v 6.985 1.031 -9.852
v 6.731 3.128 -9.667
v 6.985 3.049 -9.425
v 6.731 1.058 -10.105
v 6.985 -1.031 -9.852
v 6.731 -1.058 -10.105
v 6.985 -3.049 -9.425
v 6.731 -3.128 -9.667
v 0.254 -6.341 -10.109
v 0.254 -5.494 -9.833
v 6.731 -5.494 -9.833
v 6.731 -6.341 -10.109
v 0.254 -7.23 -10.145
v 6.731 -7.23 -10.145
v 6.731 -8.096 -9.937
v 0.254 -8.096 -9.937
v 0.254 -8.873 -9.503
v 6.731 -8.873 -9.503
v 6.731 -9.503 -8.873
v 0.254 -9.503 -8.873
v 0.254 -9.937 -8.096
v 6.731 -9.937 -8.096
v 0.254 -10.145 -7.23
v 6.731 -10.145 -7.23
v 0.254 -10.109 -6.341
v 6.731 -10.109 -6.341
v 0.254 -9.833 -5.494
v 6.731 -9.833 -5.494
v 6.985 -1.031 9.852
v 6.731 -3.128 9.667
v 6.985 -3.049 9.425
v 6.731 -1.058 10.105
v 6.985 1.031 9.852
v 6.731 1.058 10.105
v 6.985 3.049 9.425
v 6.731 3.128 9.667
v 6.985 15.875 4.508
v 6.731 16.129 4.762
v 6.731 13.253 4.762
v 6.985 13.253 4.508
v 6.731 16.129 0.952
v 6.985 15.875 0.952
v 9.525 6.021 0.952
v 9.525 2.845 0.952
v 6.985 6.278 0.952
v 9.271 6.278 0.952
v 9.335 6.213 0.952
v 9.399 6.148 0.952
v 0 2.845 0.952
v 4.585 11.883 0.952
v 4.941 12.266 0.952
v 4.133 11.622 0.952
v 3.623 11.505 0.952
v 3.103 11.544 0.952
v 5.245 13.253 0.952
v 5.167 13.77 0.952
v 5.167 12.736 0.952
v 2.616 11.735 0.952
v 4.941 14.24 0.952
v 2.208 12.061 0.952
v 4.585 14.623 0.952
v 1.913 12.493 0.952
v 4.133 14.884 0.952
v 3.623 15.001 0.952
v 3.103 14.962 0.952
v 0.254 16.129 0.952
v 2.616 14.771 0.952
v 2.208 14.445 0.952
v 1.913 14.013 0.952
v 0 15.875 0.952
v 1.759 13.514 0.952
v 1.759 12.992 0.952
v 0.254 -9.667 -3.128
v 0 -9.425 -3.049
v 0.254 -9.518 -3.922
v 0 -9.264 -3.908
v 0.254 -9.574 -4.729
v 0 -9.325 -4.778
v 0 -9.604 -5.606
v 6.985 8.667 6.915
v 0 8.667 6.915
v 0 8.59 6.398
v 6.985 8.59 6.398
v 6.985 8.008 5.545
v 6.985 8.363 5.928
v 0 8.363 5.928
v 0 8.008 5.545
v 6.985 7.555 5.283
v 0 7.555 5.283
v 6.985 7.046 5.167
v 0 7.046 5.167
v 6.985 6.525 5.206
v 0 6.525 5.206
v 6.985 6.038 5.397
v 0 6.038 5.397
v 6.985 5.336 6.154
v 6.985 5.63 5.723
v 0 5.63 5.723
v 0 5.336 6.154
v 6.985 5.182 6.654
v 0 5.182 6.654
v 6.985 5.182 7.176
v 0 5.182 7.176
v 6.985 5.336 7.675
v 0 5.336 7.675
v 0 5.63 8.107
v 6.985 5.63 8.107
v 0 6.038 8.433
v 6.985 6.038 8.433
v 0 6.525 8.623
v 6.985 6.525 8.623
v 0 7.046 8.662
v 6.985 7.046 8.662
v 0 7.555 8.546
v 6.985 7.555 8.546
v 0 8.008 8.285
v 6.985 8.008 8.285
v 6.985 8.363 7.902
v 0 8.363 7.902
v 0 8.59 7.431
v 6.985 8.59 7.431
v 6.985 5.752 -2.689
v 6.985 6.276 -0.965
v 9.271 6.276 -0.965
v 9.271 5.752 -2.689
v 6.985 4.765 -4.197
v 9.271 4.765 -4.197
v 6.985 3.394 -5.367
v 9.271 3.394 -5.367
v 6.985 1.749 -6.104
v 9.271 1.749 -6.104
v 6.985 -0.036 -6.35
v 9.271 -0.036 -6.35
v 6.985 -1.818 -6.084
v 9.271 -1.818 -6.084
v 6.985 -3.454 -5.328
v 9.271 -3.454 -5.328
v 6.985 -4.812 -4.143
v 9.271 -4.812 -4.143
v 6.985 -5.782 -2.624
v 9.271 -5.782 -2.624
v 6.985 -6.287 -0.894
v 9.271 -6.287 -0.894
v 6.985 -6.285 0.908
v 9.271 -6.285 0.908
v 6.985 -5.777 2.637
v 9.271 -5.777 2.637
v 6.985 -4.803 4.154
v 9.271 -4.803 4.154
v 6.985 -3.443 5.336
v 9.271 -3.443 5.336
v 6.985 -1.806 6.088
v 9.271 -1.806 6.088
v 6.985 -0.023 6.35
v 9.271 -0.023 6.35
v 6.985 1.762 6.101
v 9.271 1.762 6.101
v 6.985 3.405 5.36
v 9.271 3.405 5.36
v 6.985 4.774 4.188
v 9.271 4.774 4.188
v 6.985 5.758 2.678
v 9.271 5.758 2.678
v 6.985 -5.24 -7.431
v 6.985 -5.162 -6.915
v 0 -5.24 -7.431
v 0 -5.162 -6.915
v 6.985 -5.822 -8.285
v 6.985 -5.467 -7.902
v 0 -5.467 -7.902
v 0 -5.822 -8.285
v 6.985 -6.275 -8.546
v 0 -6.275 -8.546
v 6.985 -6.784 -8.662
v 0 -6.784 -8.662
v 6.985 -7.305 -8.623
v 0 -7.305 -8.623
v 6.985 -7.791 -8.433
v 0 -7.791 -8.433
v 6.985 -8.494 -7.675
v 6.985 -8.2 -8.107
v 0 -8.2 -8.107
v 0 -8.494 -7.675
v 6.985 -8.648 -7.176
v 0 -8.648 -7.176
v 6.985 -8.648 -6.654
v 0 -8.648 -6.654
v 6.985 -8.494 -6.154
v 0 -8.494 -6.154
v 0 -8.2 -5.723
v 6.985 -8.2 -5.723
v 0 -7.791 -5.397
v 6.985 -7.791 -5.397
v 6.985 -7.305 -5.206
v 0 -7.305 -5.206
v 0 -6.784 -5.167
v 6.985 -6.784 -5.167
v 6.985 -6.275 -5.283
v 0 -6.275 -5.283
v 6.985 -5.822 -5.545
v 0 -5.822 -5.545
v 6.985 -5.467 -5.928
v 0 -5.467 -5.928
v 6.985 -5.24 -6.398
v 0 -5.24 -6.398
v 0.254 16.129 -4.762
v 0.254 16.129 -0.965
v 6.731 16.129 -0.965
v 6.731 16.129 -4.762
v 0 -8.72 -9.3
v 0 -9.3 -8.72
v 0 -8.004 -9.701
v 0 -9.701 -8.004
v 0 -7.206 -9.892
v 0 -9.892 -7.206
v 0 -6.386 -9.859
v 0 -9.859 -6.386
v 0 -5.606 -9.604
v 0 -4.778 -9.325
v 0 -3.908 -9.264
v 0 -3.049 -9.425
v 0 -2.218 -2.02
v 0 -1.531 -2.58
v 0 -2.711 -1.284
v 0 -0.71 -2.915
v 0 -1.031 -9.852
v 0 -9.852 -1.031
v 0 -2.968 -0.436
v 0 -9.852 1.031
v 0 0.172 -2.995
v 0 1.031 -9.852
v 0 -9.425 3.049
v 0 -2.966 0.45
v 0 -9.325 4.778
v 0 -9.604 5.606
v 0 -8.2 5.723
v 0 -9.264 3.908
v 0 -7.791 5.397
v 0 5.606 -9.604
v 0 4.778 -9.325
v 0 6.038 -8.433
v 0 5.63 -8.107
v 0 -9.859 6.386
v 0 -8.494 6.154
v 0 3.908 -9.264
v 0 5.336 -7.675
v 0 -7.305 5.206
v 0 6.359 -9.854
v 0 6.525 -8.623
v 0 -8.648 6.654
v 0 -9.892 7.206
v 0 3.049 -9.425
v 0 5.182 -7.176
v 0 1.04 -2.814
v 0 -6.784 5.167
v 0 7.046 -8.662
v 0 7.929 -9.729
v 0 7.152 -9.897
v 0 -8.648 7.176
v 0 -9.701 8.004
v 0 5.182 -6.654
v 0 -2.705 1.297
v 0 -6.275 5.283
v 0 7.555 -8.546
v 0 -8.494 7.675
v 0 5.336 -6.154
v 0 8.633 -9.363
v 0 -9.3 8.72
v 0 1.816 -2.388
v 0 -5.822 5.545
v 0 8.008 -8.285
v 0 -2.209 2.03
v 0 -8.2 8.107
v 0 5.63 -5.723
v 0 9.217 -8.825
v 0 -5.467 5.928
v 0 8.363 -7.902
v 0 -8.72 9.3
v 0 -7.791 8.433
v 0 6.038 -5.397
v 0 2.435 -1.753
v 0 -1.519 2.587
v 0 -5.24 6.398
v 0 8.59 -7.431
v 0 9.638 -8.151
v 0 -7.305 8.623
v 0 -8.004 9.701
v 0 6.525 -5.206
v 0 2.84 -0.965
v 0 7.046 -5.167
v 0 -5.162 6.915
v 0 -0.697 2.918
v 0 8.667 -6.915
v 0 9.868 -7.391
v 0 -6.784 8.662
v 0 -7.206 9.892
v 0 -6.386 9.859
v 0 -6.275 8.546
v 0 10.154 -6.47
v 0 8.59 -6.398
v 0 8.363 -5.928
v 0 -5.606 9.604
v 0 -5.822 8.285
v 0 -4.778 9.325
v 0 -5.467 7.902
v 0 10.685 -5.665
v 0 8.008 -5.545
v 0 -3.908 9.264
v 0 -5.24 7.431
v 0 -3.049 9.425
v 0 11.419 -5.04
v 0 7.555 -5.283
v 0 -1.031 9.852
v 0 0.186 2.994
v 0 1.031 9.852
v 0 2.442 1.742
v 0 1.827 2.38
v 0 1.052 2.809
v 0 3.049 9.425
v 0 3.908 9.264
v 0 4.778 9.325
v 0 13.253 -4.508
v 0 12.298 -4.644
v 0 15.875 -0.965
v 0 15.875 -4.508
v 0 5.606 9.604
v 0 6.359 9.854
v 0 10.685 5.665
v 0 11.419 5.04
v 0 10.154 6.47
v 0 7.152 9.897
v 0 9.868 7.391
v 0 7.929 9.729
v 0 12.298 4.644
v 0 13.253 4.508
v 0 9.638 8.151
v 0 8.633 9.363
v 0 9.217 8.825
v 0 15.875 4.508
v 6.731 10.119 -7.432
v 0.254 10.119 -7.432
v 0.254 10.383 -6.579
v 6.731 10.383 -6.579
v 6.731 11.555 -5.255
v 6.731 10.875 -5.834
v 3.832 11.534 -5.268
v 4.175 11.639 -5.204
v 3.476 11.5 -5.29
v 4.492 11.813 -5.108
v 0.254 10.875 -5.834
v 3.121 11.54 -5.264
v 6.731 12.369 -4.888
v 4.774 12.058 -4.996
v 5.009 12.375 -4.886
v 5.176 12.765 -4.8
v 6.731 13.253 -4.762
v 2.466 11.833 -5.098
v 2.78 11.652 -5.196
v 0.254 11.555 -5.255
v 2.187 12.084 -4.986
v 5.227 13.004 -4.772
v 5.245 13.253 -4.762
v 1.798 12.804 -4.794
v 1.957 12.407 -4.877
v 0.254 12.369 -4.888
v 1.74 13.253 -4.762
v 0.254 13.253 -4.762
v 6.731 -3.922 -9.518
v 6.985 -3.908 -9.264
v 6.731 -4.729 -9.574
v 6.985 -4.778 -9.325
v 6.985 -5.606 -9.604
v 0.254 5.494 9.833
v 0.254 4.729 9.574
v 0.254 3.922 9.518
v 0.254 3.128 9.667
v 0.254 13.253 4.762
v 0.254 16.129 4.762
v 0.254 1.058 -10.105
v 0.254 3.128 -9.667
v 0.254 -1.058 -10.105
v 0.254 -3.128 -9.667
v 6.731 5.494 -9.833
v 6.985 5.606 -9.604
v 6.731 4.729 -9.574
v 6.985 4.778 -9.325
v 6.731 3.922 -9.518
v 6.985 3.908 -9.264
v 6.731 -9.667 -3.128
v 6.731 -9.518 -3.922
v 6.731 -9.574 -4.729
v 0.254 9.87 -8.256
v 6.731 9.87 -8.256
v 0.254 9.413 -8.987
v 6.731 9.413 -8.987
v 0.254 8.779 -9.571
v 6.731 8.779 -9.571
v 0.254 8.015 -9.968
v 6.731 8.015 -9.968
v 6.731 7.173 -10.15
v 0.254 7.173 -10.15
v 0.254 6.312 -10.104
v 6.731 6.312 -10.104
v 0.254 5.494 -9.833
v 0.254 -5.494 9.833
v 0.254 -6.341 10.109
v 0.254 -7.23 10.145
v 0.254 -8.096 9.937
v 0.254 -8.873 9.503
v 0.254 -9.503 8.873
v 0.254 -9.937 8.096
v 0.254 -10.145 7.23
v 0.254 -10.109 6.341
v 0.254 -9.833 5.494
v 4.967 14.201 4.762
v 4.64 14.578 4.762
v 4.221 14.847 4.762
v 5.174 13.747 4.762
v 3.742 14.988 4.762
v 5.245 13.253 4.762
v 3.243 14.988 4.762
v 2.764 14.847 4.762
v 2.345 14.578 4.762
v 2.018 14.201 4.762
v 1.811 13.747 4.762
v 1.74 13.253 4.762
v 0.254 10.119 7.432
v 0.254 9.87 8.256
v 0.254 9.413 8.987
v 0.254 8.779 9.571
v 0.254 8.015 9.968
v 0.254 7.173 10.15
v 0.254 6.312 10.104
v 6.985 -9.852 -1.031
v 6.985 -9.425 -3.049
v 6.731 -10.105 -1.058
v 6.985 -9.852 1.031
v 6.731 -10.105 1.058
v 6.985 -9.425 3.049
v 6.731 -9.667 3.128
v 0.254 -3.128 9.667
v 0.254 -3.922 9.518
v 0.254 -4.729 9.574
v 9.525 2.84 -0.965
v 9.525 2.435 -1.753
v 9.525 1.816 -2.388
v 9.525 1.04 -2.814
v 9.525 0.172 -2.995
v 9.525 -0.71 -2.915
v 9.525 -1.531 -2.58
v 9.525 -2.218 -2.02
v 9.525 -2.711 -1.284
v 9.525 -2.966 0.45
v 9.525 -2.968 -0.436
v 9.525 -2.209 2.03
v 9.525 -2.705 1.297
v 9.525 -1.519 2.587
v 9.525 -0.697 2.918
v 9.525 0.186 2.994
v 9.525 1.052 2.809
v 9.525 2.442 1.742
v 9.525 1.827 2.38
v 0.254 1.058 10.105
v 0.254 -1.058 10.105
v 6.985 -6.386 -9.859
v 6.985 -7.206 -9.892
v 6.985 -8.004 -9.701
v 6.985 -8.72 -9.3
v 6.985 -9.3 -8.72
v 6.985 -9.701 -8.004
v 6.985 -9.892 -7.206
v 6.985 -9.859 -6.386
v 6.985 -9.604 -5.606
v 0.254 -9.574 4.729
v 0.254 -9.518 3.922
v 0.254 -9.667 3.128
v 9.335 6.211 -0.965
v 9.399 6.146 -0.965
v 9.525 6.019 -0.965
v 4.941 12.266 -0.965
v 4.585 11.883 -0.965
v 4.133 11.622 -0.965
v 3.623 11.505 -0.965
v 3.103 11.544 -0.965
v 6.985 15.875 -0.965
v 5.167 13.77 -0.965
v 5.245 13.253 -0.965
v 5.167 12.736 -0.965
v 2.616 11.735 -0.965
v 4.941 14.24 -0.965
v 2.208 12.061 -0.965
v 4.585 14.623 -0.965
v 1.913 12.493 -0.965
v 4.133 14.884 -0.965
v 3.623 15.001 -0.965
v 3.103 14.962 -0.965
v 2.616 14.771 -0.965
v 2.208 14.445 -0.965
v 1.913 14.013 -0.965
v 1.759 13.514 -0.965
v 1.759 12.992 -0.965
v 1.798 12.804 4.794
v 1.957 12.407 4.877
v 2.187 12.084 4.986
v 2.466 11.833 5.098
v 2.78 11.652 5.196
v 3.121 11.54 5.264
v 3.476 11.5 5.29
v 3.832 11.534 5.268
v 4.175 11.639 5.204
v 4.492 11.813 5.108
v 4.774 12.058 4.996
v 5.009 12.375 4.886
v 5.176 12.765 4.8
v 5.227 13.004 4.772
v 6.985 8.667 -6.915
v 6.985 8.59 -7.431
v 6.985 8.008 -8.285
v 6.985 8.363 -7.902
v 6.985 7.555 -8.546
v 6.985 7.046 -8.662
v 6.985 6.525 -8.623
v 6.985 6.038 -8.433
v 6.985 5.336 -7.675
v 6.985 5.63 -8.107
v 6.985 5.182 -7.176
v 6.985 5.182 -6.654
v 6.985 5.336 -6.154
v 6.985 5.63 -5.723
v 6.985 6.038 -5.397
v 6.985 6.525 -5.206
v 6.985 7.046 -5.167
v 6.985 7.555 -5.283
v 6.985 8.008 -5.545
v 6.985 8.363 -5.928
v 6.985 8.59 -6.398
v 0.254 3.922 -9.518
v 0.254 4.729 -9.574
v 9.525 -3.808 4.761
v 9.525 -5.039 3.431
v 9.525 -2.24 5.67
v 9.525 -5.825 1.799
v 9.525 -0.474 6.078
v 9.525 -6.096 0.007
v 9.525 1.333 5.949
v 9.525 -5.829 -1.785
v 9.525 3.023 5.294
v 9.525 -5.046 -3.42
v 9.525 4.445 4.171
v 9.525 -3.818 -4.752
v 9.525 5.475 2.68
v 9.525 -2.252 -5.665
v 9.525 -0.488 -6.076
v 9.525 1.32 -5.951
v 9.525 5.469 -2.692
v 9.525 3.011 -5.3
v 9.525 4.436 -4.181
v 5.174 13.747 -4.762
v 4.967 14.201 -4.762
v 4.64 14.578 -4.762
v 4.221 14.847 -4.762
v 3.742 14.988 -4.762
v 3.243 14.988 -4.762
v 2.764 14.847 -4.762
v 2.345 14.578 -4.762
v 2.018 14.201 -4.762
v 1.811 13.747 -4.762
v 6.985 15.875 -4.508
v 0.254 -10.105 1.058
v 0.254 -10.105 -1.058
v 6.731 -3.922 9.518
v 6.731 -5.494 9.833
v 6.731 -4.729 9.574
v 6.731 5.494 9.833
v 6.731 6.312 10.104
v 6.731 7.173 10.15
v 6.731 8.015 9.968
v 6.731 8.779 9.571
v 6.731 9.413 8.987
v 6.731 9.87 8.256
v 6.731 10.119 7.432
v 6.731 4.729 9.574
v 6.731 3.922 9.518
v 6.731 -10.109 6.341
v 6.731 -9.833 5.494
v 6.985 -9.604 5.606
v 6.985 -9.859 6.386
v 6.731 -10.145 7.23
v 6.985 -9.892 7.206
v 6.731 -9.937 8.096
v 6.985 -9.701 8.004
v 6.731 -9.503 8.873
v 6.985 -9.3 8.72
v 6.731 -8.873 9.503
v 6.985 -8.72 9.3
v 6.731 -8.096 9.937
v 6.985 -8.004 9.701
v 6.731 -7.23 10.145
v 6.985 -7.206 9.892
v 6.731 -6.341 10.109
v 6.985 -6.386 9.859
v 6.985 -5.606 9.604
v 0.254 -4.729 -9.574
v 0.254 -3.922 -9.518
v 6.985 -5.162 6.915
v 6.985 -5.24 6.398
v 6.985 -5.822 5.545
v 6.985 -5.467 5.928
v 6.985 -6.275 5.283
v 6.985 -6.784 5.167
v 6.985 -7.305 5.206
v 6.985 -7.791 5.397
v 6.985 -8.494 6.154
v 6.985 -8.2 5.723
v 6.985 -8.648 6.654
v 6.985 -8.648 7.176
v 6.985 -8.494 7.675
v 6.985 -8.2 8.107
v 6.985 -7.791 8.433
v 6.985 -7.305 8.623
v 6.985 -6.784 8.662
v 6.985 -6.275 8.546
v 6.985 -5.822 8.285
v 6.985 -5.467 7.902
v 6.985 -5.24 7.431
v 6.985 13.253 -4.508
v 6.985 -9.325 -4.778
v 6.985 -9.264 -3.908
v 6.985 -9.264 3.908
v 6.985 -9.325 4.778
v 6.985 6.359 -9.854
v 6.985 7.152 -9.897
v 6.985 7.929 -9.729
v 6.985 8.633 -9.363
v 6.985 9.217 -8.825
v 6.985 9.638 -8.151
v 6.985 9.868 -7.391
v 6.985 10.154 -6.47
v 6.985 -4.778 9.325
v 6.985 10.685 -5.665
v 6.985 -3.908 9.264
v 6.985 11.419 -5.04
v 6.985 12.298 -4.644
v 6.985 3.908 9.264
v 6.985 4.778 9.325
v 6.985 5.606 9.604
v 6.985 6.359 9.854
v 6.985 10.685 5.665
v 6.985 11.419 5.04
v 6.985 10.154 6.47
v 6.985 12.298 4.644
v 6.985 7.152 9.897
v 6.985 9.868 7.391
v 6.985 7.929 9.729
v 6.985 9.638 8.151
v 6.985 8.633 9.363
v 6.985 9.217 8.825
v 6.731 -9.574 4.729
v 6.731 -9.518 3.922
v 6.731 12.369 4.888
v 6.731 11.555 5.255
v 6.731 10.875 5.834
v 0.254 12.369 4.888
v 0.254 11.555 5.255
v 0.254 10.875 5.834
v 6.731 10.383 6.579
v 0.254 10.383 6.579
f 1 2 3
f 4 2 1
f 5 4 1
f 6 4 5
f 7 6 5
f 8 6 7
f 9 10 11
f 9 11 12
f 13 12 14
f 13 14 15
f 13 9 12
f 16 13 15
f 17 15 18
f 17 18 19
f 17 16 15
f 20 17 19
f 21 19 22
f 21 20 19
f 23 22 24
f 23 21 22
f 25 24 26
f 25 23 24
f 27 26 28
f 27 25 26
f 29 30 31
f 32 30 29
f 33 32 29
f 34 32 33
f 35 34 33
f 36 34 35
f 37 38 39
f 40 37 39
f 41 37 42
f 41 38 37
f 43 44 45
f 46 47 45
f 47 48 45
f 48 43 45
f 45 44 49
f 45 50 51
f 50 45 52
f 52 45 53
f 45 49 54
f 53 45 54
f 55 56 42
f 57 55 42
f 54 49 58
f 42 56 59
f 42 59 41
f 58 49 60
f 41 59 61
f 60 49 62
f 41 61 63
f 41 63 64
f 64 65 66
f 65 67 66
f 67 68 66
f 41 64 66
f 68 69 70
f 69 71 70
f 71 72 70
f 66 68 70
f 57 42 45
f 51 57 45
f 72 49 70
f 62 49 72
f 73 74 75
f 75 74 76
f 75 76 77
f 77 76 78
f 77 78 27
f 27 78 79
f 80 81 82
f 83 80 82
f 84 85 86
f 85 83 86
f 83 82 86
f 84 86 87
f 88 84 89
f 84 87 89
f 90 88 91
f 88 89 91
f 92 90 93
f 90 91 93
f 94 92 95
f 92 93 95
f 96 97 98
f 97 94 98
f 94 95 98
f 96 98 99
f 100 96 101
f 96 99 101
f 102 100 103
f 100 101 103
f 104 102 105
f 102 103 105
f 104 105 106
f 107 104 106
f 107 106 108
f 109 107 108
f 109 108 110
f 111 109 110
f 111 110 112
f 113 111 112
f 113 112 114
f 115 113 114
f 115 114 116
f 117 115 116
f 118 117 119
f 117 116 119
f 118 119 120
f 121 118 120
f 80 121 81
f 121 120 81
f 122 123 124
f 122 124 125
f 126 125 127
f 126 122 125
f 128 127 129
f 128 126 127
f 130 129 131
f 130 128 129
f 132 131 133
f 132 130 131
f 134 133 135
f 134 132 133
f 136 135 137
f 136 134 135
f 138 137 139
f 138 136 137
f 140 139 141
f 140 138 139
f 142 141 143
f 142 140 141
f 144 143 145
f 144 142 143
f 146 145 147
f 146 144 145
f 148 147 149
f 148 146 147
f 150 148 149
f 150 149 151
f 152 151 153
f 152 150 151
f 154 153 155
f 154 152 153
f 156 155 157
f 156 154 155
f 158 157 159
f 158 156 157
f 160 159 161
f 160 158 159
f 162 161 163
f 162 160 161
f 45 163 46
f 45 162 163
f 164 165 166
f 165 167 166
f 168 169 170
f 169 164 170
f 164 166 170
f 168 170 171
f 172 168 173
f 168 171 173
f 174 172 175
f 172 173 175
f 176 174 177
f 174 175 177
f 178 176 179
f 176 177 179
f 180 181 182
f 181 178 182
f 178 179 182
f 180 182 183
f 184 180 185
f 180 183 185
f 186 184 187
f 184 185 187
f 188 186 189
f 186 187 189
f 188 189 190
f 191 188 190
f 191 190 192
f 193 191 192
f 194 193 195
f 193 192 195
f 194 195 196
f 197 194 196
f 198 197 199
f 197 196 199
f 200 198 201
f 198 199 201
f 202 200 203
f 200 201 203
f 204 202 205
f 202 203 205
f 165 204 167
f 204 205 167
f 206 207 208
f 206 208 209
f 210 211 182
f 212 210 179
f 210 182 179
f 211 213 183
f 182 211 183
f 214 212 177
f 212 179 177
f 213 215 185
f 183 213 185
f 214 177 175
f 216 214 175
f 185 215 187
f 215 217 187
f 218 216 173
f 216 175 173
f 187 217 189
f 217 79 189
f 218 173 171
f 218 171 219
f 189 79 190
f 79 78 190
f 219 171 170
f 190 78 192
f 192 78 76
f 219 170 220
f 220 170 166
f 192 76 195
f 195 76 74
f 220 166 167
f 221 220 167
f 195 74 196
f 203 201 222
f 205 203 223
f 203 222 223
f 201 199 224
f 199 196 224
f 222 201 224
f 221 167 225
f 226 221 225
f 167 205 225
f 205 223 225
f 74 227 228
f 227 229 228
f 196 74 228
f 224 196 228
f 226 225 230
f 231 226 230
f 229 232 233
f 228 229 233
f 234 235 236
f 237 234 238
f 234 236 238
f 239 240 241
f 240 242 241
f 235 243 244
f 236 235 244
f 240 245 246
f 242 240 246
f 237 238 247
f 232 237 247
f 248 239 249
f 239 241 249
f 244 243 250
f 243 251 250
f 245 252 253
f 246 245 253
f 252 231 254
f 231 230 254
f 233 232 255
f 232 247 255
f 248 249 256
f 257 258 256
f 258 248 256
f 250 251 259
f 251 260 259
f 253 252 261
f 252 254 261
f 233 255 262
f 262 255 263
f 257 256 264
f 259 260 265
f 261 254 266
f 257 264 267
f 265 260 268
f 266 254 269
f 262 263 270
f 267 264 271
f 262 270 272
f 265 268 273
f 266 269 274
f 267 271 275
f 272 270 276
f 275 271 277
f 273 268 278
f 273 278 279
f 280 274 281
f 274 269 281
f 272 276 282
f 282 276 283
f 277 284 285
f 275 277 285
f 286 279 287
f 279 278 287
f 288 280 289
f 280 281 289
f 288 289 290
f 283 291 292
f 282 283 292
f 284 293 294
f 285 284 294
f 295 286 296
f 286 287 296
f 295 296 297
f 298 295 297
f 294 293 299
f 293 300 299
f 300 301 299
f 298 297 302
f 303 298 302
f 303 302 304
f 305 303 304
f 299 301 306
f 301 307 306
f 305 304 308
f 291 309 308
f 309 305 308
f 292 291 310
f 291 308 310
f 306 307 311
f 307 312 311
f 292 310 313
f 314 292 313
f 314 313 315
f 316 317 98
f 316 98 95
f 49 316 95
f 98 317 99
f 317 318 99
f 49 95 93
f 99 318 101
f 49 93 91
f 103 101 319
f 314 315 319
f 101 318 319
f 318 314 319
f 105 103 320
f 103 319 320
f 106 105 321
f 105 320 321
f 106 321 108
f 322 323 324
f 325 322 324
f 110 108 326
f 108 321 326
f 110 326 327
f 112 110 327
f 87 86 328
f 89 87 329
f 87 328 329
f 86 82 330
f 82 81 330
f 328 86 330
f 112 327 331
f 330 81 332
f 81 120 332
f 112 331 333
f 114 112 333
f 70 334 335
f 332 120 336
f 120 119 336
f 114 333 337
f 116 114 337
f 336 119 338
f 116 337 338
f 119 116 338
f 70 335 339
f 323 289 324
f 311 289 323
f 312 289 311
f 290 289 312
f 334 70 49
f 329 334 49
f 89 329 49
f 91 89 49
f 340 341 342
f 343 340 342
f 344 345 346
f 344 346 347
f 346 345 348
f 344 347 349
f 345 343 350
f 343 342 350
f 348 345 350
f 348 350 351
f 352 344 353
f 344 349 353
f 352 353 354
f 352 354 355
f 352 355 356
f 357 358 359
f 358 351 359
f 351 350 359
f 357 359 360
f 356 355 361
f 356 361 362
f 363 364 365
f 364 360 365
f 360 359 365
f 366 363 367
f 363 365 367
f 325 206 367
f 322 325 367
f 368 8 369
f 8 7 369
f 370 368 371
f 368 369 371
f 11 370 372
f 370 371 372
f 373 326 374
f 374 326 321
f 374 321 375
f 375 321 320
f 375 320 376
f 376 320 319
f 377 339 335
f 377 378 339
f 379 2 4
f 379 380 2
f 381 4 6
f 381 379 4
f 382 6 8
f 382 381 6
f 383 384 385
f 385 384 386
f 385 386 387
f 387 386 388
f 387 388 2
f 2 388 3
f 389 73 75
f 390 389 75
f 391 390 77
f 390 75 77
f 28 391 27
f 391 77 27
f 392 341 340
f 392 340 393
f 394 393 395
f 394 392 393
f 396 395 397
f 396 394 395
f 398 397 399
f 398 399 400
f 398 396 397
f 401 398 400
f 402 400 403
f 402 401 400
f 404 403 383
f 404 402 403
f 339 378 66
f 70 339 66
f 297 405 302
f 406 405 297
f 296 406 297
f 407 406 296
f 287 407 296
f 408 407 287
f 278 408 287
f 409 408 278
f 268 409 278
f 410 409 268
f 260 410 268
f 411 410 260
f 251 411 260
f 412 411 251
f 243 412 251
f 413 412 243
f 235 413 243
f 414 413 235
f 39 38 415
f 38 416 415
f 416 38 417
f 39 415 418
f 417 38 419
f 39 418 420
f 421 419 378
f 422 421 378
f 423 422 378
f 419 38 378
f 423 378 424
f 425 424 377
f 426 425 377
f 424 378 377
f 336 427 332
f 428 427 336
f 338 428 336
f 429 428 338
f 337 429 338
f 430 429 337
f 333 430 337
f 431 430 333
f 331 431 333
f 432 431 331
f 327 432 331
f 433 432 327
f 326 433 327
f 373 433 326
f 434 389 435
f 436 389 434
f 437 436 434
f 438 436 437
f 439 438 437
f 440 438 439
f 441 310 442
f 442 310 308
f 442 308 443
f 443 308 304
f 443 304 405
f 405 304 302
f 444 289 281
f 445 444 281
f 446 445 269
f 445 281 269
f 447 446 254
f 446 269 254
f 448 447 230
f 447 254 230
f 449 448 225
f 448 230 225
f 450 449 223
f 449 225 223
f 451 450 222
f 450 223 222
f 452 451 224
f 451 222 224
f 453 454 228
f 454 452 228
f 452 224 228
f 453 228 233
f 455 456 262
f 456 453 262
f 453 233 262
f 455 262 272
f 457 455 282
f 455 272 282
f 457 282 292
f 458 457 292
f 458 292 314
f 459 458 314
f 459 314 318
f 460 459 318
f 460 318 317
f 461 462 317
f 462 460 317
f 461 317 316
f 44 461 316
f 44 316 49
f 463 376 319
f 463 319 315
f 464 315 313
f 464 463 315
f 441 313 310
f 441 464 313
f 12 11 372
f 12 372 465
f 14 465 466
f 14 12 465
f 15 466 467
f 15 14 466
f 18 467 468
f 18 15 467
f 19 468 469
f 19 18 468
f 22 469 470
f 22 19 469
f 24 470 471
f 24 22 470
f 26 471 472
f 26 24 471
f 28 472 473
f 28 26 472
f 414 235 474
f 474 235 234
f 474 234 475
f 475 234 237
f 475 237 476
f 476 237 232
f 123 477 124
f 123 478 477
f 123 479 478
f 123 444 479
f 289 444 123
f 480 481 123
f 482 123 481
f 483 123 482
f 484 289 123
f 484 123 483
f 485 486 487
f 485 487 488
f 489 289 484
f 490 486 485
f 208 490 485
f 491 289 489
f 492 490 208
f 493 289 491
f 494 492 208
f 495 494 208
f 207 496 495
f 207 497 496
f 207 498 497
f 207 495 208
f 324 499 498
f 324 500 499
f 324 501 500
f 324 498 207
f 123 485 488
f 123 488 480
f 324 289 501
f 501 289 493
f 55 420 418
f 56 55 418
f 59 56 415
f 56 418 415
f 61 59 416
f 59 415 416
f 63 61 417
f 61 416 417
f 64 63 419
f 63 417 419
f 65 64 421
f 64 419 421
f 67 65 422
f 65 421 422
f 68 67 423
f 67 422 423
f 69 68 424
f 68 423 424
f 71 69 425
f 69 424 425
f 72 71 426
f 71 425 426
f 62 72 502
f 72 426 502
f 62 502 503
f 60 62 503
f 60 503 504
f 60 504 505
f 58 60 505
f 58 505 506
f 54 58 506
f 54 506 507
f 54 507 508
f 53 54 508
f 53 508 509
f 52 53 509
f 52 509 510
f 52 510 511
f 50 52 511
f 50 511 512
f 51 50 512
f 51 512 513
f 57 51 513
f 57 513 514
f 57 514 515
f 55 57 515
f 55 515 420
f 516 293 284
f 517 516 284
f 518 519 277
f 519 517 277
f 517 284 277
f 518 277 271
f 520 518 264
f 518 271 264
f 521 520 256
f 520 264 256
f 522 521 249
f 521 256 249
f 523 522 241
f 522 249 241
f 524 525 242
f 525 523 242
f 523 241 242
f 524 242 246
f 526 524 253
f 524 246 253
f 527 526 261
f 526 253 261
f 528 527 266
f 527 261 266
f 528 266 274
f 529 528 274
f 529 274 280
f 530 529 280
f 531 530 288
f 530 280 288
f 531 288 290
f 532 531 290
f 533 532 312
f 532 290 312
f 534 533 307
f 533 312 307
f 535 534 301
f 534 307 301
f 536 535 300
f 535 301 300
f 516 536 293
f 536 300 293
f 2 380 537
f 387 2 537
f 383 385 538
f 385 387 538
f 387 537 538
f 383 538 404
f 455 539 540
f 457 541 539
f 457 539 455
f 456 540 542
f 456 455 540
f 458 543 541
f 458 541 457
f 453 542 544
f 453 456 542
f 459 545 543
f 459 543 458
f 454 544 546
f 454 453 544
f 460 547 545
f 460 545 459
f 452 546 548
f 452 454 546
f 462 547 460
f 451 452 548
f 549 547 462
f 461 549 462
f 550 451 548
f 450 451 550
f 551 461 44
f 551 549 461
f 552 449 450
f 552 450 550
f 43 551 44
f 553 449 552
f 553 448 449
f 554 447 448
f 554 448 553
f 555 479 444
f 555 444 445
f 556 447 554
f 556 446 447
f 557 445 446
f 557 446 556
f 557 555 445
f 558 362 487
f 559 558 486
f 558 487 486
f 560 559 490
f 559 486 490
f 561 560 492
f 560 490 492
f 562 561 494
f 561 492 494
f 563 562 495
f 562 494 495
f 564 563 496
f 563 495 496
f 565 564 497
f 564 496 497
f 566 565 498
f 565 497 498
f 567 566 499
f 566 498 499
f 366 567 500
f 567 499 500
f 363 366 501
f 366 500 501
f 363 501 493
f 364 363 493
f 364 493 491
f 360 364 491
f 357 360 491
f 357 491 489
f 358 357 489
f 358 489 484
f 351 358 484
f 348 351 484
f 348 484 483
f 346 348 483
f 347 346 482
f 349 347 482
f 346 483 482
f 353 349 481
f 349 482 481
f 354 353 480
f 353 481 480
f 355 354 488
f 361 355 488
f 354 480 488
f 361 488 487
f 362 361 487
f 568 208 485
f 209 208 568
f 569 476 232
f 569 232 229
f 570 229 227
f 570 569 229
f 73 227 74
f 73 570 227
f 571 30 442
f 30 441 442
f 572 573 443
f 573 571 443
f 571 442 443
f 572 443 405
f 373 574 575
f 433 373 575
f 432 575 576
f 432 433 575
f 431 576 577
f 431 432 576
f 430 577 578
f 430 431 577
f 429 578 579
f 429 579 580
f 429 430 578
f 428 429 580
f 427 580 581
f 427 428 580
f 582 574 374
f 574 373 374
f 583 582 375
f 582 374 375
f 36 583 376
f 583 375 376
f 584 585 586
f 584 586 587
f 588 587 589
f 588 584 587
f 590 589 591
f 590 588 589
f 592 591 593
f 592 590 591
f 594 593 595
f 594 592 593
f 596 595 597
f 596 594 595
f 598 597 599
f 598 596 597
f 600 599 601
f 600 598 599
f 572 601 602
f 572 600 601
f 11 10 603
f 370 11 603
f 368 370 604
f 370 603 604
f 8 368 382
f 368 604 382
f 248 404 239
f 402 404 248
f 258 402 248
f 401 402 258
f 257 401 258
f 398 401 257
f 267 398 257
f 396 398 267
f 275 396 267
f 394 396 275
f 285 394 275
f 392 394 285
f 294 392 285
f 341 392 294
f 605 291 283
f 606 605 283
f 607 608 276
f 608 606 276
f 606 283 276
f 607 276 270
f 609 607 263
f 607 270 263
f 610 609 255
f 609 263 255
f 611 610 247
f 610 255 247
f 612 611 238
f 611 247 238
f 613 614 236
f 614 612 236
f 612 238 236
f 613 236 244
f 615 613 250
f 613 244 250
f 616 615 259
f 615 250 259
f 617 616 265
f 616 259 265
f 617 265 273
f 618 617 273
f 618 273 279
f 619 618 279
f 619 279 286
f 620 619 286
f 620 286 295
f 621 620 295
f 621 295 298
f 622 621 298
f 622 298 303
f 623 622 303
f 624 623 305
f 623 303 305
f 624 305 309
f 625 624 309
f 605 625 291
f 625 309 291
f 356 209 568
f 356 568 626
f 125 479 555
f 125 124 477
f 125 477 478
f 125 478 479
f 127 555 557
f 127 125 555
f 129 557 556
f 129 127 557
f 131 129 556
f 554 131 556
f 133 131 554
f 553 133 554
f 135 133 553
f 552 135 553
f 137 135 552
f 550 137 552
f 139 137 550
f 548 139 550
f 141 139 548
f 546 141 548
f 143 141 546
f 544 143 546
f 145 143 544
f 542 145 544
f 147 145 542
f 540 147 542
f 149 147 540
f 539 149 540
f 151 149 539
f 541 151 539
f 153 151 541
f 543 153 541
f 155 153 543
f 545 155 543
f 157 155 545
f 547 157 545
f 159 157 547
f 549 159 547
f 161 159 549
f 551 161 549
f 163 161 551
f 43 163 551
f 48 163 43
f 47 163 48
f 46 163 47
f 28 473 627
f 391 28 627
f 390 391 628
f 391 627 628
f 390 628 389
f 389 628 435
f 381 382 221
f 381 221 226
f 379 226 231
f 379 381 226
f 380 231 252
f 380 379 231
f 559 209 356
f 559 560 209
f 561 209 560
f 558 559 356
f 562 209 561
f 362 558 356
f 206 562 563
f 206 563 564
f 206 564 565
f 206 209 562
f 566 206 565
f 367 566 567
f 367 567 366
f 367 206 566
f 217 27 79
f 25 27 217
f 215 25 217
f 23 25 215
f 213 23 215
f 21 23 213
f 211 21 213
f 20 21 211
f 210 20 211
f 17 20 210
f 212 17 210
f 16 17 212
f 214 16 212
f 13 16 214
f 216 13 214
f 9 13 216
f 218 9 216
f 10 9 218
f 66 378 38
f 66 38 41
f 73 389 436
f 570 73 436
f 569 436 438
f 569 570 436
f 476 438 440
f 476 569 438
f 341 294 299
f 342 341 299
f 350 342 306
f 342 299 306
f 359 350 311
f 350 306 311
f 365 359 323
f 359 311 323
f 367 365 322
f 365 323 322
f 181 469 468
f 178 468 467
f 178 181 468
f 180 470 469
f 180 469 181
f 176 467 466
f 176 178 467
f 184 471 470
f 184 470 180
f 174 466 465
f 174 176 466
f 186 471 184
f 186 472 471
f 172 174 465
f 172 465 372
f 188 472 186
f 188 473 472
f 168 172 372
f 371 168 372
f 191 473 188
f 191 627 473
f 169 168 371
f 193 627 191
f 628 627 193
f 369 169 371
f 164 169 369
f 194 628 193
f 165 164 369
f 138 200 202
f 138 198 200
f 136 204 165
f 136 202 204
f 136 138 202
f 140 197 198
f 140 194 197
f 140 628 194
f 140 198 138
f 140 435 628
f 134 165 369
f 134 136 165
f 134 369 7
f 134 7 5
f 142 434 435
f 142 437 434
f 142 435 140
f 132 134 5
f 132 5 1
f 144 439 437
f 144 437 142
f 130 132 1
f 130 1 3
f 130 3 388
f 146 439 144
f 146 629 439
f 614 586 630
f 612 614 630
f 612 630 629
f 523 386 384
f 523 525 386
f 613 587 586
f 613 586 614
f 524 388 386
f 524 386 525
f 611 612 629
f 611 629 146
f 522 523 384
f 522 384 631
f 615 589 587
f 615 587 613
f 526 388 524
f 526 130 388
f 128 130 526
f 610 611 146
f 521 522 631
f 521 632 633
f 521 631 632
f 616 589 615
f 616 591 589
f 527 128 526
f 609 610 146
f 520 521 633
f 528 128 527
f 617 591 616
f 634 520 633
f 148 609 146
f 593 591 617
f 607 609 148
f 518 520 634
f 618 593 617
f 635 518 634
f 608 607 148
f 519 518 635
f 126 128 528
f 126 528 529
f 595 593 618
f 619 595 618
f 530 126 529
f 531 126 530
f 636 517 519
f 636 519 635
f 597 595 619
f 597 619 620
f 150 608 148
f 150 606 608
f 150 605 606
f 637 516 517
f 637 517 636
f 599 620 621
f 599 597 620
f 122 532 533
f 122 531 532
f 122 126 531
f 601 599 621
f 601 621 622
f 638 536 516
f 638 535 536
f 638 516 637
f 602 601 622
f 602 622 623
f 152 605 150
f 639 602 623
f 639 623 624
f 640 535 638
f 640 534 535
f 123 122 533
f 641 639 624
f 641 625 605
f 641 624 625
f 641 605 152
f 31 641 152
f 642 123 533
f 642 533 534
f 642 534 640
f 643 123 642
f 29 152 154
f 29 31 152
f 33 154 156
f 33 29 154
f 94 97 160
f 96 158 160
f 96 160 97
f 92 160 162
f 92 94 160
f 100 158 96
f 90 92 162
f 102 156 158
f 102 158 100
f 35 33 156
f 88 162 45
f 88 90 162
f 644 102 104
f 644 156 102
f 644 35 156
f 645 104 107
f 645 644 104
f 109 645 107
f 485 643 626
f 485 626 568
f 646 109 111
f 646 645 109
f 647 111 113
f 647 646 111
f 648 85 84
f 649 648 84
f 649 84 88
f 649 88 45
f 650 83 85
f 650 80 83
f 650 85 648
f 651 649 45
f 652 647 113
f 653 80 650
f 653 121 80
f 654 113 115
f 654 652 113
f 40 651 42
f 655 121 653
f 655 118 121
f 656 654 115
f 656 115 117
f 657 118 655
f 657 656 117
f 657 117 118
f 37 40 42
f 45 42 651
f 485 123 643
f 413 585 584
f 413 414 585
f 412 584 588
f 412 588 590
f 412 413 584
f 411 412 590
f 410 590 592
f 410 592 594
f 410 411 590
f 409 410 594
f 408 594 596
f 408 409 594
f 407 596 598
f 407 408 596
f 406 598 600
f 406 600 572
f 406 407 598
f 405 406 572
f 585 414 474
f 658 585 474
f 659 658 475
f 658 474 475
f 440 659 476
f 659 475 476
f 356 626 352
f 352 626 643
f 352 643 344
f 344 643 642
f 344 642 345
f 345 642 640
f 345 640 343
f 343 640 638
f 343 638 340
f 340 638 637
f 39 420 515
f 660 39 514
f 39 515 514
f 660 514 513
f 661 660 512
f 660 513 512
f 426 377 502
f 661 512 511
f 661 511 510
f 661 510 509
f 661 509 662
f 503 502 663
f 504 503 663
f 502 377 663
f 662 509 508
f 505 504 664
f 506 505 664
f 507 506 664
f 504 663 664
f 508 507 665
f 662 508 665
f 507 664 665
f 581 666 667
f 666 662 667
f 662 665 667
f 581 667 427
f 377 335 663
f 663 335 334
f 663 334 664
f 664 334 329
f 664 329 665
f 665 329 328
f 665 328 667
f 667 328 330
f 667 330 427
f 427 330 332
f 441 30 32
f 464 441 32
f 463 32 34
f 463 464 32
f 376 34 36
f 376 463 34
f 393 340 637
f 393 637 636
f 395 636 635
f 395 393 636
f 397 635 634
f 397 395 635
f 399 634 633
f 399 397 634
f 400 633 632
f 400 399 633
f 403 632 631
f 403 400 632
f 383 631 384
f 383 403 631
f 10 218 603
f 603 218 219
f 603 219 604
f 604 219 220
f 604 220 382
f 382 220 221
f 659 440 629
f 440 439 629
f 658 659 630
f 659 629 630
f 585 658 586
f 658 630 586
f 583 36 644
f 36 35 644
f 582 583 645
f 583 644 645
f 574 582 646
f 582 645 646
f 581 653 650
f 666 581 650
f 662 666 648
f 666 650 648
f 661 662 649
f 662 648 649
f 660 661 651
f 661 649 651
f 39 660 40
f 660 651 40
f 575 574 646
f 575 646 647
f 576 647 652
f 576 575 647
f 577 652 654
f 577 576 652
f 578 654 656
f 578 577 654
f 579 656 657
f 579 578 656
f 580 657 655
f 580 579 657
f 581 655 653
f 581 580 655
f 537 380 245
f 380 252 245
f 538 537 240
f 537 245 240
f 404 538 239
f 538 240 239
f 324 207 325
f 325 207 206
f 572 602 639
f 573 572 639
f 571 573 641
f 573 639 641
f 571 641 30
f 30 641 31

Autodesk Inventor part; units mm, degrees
ref_plane "YZ Plane" through (0, 0, 0) normal (1, 0, 0) x (0, 1, 0)
ref_plane "XZ Plane" through (0, 0, 0) normal (0, 1, 0) x (-1, 0, 0)
ref_plane "XY Plane" through (0, 0, 0) normal (0, 0, 1) x (1, 0, 0)
sketch "Sketch1" plane through (0, 0, 0) normal (1, 0, 0) x (0, 1, 0)
  line L0 (-6.9148, -6.9148) -> (6.9148, 6.9148) construction
  circle A0 centre (0, 0) radius 9.779 construction
  line L1 (6.9148, -6.9148) -> (-7.1842, 7.1842) construction
  line L2 (0, 0) -> (9.779, 0) construction
  circle A1 centre (-6.9148, 6.9148) radius 1.7526
  circle A2 centre (6.9148, 6.9148) radius 1.7526
  circle A3 centre (-6.9148, -6.9148) radius 1.7526
  circle A4 centre (6.9148, -6.9148) radius 1.7526
  line L3 (-6.9148, -10.16) -> (-6.9148, 10.16) construction
  arc A5 (-5.4945, 9.8327) -> (-9.8327, 5.4945) centre (-6.9148, 6.9148) ccw
  arc A6 (-9.8327, -5.4945) -> (-5.4945, -9.8327) centre (-6.9148, -6.9148) ccw
  arc A7 (5.4945, -9.8327) -> (10.1186, -7.4317) centre (6.9148, -6.9148) ccw
  arc A8 (10.1186, 7.4317) -> (5.4945, 9.8327) centre (6.9148, 6.9148) ccw
  arc A9 (2.8448, 0.9525) -> (2.8405, -0.9652) centre (0, 0) ccw
  arc A10 (3.1276, 9.6666) -> (-3.1276, 9.6666) centre (0, 0) ccw
  line L4 (-10.16, 0) -> (16.129, 0) construction
  line L5 (16.129, 0.9525) -> (16.129, 4.7625) construction
  line L6 (16.129, -0.9652) -> (16.129, -4.7625) construction
  line L7 (16.129, 4.7625) -> (13.253, 4.7625)
  line L8 (16.129, -4.7625) -> (13.253, -4.7625)
  arc A11 (-9.6666, 3.1276) -> (-9.6666, -3.1276) centre (0, 0) ccw
  arc A12 (-3.1276, -9.6666) -> (3.1276, -9.6666) centre (0, 0) ccw
  line L9 (-10.16, -0.9652) -> (-10.114, -0.9652)
  line L10 (2.8405, -0.9652) -> (16.129, -0.9652)
  line L11 (-10.16, 0.9525) -> (-10.1153, 0.9525)
  line L12 (2.8448, 0.9525) -> (16.129, 0.9525)
  line L13 (16.129, 4.7625) -> (16.129, 0.9525)
  line L14 (16.129, -0.9652) -> (16.129, -4.7625)
  arc A13 (10.1186, 7.4317) -> (13.253, 4.7625) centre (13.253, 7.9375) ccw
  arc A14 (13.253, -4.7625) -> (10.1186, -7.4317) centre (13.253, -7.9375) ccw
  arc A15 (3.1276, 9.6666) -> (5.4945, 9.8327) centre (4.1049, 12.6875) ccw
  arc A16 (-5.4945, 9.8327) -> (-3.1276, 9.6666) centre (-4.1049, 12.6875) ccw
  arc A17 (-9.6666, 3.1276) -> (-9.8327, 5.4945) centre (-12.6875, 4.1049) ccw
  arc A18 (-9.8327, -5.4945) -> (-9.6666, -3.1276) centre (-12.6875, -4.1049) ccw
  arc A19 (-3.1276, -9.6666) -> (-5.4945, -9.8327) centre (-4.1049, -12.6875) ccw
  arc A20 (5.4945, -9.8327) -> (3.1276, -9.6666) centre (4.1049, -12.6875) ccw
  point P0 (9.3436, 4.7625)
  point P1 (9.3436, -4.7625)
  dimension "d4" = 19.558
  dimension "d6" = 3.5052
  dimension "d7" = 3.5052
  dimension "d8" = 3.5052
  dimension "d9" = 3.5052
  dimension "d11" = 6
  dimension "d12" = 26.289
  dimension "d18" = 3.175
  dimension "d19" = 3.175
extrude "Extrusion1" add sketch "Sketch1" along normal blind 6.985
sketch "Sketch2" plane through (6.985, 0, 0) normal (1, 0, 0) x (0, 0, -1)
  line L0 (0.9652, 16.129) -> (0.9652, 2.8405) projected
  arc A0 (-0.9525, 2.8448) -> (0.9652, 2.8405) centre (0, 0) ccw projected
  line L1 (-0.9525, 2.8448) -> (-0.9525, 16.129) projected
  arc A1 (-0.9525, 6.2782) -> (0.9652, 6.2762) centre (0, 0) ccw
  arc A2 (-0.9525, 2.8448) -> (0.9652, 2.8405) centre (0, 0) ccw
  line L2 (-0.9525, 2.8448) -> (-0.9525, 6.2782)
  line L3 (0.9652, 2.8405) -> (0.9652, 6.2762)
  dimension "d22" = 12.7
extrude "Extrusion2" add sketch "Sketch2" along normal blind 2.54
sketch "Sketch3" plane through (0, 13.253, 4.7625) normal (0, 0, 1) x (1, 0, 0)
  line L0 (0, 0) -> (6.985, 0) projected
  circle A0 centre (3.4925, 0) radius 1.7526
  point P0 (0, -13.253)
  dimension "d25" = 3.5052
extrude "Extrusion3" cut sketch "Sketch3" along normal mid plane 29.5275
thread "Thread1" size "6-32 UNC" class "2B" standard "ANSI Unified Screw Threads" full length
thread "Thread2" size "6-32 UNC" class "2B" standard "ANSI Unified Screw Threads" full length
chamfer "Chamfer1" distance 0.254 angle 45 39 edges at (6.985, 11.1945, 5.5202) (6.985, 8.4102, 9.7949) (6.985, 4.3271, 9.5202) (6.985, 0, 10.16) (6.985, -4.3271, 9.5202) (6.985, -9.2095, 9.2095) (6.985, -9.5202, 4.3271) (6.985, -10.16, 0) (6.985, -9.5202, -4.3271) (6.985, -9.2095, -9.2095) (6.985, -4.3271, -9.5202) (6.985, 0, -10.16) (6.985, 4.3271, -9.5202) (6.985, 8.4102, -9.7949) (6.985, 11.1945, -5.5202) (6.985, 14.691, -4.7625) (6.985, 14.691, 4.7625) (0, 11.1945, 5.5202) (0, 8.4102, 9.7949) (0, 4.3271, 9.5202) (0, 0, 10.16) (0, -4.3271, 9.5202) (0, -9.2095, 9.2095) (0, -9.5202, 4.3271) (0, -10.16, 0) (0, -9.5202, -4.3271) (0, -9.2095, -9.2095) (0, -4.3271, -9.5202) (0, 0, -10.16) (0, 4.3271, -9.5202) (0, 8.4102, -9.7949) (0, 11.1945, -5.5202) (0, 14.691, -4.7625) (0, 14.691, 4.7625) (9.525, -6.35, 0.0064) (6.985, 16.129, -2.8638) (6.985, 16.129, 2.8575) (0, 16.129, -2.8638) (0, 16.129, 2.8575)
properties part number "Clamping Hub"
